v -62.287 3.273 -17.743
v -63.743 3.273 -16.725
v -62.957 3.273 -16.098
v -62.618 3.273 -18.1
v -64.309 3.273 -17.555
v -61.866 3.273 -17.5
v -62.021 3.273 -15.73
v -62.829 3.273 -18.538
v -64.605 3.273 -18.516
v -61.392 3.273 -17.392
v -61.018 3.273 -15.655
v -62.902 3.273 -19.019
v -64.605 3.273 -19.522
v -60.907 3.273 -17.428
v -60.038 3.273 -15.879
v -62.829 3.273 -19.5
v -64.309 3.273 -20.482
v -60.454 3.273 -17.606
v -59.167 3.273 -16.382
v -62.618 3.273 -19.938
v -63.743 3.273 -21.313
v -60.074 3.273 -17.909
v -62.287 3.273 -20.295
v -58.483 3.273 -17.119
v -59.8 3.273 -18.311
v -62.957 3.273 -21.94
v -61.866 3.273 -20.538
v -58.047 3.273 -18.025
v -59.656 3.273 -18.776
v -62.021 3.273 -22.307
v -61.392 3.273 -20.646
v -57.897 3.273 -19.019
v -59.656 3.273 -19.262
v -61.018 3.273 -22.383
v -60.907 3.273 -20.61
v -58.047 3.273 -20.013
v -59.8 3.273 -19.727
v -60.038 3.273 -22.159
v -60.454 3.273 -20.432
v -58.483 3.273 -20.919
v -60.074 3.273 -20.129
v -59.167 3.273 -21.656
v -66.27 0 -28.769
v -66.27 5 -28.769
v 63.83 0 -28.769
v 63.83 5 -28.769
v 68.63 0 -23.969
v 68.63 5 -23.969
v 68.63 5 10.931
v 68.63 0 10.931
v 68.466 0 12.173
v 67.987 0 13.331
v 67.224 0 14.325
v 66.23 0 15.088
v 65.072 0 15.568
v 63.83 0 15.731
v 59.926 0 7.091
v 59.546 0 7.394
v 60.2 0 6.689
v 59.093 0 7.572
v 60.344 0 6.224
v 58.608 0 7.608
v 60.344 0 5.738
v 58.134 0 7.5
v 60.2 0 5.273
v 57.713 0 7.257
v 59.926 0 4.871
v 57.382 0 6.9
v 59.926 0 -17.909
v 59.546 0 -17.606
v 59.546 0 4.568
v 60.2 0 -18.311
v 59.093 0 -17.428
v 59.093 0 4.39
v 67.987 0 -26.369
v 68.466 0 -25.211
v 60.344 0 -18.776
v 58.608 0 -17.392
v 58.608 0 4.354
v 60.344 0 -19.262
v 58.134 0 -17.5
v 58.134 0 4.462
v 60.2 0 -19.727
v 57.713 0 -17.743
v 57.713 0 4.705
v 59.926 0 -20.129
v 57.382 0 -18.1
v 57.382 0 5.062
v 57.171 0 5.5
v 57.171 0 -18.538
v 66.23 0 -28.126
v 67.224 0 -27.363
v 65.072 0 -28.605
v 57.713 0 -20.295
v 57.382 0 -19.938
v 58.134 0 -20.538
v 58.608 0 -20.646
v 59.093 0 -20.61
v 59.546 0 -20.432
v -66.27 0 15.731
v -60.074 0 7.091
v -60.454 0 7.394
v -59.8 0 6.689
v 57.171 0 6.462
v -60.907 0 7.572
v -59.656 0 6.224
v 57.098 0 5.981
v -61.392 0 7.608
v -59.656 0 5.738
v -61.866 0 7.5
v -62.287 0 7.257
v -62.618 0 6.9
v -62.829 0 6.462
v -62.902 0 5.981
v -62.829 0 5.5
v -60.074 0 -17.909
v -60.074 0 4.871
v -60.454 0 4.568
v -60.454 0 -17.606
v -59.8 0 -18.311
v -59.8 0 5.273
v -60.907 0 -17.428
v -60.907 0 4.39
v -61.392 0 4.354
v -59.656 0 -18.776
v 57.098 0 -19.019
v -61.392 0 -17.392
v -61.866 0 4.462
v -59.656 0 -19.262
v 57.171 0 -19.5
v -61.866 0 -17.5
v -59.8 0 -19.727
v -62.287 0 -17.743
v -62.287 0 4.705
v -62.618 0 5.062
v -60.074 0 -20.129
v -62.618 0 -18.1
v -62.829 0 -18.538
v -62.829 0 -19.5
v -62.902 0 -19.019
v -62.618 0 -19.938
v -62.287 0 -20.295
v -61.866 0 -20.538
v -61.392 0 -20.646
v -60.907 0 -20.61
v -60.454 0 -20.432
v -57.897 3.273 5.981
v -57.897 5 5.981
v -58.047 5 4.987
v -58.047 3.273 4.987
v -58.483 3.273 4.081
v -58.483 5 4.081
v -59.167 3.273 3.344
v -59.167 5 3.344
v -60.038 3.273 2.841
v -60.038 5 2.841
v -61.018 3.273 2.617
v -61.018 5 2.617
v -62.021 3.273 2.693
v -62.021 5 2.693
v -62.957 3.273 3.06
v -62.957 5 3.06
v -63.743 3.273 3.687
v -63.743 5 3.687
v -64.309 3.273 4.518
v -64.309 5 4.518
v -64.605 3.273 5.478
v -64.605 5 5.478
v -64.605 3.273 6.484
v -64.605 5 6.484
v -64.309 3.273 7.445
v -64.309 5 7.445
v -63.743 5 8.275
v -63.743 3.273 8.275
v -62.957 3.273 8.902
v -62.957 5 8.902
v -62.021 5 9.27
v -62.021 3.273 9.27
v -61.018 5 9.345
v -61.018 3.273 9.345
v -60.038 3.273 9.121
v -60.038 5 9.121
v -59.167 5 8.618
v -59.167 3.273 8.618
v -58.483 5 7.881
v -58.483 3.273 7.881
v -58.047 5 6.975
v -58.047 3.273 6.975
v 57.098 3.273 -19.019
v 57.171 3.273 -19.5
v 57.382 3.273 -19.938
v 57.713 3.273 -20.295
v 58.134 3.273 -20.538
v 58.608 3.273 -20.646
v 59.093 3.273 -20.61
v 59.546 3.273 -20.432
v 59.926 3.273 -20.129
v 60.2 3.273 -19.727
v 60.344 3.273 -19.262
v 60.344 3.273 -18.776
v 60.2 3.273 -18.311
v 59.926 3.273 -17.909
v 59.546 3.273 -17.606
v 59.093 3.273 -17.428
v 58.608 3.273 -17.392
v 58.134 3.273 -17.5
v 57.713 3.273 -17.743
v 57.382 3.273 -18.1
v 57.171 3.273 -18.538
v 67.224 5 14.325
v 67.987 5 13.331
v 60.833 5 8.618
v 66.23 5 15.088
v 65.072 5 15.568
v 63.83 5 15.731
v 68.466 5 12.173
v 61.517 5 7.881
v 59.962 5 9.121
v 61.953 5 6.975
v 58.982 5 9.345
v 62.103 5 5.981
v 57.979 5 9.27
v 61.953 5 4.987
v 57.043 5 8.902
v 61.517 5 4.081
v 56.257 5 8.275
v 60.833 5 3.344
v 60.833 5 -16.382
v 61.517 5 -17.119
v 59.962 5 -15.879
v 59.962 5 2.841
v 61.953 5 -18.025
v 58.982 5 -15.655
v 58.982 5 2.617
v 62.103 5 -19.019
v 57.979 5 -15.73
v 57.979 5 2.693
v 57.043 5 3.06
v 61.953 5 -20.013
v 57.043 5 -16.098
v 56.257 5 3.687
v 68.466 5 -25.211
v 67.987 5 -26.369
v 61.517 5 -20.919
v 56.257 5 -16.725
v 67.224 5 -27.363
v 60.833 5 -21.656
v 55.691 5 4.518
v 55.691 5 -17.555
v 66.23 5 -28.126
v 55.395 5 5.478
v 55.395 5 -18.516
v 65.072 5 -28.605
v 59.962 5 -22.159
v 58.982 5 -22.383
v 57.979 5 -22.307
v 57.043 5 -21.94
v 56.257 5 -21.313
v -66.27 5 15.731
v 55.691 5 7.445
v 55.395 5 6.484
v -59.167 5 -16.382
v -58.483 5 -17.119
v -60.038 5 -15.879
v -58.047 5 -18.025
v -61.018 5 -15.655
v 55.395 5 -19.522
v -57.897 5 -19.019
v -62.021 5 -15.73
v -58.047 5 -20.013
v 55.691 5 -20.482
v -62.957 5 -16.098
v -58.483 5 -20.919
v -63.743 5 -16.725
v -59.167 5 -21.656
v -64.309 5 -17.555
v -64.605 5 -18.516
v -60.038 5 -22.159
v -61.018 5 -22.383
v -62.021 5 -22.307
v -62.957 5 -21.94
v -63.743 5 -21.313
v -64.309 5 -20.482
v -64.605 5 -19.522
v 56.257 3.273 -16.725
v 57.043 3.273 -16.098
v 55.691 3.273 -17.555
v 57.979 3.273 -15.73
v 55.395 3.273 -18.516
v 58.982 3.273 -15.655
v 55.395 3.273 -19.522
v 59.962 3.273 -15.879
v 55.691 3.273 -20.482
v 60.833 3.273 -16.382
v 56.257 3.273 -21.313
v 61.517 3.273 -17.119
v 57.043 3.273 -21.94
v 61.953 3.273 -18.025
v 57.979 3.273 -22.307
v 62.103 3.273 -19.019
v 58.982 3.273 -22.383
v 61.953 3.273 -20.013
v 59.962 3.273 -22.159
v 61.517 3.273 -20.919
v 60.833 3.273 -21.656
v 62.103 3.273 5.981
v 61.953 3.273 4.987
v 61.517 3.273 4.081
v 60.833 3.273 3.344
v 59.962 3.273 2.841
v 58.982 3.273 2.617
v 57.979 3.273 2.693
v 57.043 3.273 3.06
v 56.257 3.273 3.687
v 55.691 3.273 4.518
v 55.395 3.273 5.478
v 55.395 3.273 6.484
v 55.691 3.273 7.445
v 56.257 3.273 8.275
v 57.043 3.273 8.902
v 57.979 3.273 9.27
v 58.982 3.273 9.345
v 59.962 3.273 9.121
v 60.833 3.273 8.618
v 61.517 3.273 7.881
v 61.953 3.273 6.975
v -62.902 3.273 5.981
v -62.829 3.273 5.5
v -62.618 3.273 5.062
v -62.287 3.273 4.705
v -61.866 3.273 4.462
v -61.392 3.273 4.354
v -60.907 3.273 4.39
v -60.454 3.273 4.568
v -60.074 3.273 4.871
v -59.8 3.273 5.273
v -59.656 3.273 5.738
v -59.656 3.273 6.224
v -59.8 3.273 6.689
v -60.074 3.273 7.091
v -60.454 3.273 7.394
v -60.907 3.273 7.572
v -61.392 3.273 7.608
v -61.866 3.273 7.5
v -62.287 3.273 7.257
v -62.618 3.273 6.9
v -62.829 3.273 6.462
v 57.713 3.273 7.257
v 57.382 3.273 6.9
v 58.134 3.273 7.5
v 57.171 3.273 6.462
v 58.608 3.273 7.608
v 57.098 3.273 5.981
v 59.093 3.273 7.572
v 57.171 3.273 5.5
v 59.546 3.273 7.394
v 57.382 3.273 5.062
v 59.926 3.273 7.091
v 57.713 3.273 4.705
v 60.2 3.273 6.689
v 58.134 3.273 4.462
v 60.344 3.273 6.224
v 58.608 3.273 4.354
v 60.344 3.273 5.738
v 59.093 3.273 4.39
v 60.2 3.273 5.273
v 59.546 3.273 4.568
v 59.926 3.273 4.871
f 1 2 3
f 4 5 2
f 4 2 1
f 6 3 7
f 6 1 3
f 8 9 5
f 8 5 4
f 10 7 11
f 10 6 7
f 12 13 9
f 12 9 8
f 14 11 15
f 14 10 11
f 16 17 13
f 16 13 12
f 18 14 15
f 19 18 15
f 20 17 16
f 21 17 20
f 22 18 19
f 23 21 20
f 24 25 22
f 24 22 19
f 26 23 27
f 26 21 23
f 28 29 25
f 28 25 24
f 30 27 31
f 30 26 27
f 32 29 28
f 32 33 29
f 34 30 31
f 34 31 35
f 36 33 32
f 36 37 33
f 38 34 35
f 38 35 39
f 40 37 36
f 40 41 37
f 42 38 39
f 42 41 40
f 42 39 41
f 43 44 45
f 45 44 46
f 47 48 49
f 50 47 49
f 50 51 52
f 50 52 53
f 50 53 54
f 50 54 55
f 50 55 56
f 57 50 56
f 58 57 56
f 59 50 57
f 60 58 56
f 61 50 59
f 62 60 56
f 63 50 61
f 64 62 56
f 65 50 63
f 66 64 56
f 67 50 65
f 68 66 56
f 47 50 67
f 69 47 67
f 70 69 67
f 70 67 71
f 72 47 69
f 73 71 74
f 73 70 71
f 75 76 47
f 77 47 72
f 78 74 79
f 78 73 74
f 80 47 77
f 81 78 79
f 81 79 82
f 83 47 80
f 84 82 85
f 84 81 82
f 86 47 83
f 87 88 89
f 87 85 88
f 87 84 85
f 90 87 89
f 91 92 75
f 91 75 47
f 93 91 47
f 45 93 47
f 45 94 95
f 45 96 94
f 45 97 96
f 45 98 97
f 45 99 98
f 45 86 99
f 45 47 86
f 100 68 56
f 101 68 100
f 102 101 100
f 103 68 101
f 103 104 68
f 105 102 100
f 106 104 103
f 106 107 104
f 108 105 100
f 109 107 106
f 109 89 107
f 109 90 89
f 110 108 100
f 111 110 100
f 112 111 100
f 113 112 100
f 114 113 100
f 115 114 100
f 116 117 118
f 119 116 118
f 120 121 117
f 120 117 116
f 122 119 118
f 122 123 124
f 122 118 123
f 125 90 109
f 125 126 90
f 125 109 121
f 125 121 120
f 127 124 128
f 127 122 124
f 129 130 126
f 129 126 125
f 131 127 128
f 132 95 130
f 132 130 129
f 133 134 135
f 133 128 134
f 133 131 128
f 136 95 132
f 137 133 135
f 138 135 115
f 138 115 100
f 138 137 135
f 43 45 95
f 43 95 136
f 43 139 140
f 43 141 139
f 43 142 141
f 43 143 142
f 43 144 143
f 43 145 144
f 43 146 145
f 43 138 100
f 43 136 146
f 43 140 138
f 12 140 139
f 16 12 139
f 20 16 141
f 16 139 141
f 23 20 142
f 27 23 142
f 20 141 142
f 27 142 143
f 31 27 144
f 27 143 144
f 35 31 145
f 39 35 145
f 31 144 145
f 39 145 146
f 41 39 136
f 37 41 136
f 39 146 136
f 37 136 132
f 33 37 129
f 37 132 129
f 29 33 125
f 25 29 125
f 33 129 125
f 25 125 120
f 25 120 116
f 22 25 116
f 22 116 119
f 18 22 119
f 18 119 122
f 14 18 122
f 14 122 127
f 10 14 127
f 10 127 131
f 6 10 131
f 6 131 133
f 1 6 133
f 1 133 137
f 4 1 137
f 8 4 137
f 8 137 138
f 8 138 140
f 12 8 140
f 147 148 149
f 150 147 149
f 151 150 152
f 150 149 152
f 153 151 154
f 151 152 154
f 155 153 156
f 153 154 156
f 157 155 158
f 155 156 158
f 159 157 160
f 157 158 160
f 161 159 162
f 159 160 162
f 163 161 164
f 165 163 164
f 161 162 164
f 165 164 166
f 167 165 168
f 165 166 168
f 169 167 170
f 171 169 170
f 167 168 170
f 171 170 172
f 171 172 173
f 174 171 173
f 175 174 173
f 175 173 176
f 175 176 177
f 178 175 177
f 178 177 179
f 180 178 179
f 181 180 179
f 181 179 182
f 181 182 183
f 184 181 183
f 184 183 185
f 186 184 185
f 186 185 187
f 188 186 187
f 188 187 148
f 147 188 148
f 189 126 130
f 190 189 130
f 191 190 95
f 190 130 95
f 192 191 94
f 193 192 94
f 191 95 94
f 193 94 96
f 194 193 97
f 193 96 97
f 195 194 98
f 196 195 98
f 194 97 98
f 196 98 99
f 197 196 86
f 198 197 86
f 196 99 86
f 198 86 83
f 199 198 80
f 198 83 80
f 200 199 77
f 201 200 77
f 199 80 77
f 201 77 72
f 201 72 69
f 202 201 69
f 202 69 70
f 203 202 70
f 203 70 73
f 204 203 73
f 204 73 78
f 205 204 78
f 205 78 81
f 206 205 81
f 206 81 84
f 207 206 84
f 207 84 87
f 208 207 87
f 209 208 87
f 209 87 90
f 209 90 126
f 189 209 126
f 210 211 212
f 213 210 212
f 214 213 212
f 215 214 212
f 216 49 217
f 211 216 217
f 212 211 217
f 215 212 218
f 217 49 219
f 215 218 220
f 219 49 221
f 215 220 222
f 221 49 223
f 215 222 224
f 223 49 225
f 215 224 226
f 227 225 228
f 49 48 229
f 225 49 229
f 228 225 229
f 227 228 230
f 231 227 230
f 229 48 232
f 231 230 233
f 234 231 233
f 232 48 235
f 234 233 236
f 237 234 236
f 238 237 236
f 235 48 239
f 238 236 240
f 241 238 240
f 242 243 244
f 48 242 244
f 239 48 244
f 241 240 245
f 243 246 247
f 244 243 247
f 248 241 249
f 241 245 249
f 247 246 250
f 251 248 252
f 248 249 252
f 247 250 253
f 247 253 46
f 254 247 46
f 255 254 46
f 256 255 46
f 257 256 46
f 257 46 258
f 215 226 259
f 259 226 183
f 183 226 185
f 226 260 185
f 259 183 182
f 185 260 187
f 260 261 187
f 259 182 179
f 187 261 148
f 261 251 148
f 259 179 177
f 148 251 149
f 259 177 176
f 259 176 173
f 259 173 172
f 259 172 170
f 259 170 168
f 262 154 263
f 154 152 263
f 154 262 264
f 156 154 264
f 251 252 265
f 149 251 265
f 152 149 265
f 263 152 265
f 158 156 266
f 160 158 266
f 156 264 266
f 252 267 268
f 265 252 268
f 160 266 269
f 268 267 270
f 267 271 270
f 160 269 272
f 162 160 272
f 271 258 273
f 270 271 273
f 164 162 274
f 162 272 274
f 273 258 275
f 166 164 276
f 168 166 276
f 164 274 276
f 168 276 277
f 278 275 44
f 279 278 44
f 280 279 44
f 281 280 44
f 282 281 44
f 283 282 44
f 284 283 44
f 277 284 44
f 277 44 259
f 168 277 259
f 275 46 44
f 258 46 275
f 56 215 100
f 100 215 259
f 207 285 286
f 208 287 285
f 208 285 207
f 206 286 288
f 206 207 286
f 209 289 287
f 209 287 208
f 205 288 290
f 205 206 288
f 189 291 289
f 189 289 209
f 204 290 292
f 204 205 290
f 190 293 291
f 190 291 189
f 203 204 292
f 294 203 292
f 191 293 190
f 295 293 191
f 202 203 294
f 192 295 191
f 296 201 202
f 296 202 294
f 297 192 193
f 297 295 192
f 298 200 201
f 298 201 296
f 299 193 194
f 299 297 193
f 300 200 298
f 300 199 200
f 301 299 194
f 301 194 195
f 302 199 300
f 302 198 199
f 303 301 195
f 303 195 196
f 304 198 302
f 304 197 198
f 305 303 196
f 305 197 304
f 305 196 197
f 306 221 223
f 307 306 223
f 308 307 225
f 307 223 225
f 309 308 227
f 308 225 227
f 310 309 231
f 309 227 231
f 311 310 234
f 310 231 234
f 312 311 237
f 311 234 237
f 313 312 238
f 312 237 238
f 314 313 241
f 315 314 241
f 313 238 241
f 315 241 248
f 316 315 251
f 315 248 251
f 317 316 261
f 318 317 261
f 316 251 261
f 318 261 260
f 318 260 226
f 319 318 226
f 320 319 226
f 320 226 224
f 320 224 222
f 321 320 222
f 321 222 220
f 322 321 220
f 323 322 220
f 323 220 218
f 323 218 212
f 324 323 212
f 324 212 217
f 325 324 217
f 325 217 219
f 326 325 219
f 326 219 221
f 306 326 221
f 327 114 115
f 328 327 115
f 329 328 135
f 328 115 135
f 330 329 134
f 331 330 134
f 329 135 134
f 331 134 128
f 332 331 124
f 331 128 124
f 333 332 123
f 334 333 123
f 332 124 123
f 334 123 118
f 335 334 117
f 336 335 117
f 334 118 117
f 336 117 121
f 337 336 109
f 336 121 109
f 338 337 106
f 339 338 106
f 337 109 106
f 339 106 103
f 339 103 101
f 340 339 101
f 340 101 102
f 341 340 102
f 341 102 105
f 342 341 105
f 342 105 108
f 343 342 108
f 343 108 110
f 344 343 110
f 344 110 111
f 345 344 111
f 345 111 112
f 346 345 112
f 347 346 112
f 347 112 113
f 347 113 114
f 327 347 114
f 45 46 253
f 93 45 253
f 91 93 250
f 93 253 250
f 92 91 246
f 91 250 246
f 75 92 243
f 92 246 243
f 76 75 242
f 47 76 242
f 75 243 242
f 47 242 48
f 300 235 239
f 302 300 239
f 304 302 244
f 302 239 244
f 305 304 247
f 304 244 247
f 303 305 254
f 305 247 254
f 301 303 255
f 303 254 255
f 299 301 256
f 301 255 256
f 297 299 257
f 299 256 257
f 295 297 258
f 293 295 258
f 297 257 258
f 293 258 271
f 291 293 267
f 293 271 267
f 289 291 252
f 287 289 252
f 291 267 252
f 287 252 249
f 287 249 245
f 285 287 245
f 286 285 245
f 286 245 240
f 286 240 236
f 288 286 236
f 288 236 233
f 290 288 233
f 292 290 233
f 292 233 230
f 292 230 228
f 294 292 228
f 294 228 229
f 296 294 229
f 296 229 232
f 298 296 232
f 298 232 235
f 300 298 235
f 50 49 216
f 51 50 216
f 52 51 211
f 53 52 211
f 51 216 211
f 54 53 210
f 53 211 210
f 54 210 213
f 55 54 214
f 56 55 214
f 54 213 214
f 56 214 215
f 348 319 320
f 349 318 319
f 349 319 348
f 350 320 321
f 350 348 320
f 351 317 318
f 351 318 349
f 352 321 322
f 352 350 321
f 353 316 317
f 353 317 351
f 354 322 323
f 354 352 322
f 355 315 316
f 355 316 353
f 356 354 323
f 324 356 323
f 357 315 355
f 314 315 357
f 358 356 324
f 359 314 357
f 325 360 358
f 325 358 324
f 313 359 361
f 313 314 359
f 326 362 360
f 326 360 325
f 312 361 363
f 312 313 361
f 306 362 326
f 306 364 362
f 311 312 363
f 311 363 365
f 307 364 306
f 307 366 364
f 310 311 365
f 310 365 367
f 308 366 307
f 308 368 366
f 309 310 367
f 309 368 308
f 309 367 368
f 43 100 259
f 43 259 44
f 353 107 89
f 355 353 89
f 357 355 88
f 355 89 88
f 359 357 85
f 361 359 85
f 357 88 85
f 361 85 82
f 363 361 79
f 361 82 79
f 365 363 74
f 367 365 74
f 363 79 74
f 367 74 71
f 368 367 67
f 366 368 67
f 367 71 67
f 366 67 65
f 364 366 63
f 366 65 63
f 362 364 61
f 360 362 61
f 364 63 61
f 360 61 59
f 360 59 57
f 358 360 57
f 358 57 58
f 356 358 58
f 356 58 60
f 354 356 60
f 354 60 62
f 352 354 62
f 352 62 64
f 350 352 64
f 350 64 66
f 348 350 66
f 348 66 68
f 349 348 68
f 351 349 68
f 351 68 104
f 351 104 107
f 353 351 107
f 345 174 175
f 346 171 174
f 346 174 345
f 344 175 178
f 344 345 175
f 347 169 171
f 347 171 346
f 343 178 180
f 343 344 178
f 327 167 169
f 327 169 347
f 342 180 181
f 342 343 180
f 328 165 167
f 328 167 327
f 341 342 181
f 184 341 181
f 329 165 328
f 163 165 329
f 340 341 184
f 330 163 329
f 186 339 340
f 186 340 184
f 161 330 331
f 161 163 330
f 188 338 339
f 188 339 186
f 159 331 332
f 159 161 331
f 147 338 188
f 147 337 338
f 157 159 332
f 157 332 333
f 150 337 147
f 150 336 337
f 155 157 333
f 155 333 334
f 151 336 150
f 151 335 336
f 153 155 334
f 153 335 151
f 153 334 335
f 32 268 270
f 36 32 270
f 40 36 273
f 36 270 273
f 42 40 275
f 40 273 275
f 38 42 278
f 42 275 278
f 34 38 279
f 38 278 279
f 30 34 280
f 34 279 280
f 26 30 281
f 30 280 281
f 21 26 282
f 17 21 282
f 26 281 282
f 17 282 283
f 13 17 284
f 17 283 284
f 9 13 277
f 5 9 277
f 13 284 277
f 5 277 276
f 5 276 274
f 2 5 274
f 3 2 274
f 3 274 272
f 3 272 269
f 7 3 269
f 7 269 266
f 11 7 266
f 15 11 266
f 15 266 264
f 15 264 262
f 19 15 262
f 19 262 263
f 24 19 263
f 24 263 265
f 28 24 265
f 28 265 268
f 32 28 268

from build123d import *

# Parameters (mm, degrees)
SKETCH1_W                                           = 130
SKETCH1_H                                           = 44.5
BOSS_EXTRUDE1_DEPTH                                 = 5
CBORE_FOR_4_BINDING_HEAD_MACHINE_SCREW1_D           = 3.2639
CBORE_FOR_4_BINDING_HEAD_MACHINE_SCREW1_DEPTH       = 5
CBORE_FOR_4_BINDING_HEAD_MACHINE_SCREW1_CBORE_D     = 6.74624
CBORE_FOR_4_BINDING_HEAD_MACHINE_SCREW1_CBORE_DEPTH = 1.7272
BOSS_EXTRUDE2_DEPTH                                 = 5


with BuildPart() as part:
    # Sketch1 → Boss-Extrude1 (new body)
    with BuildSketch(Plane(origin=(0, 0, 0), x_dir=(1, 0, 0), z_dir=(0, 1, 0))):
        with Locations((-1.26999387, 6.518895388)):
            Rectangle(SKETCH1_W, SKETCH1_H)
    extrude(amount=BOSS_EXTRUDE1_DEPTH)

    # CBORE for #4 Binding Head Machine Screw1
    with Locations(Plane(origin=(0, 5, 0), x_dir=(1, 0, 0), z_dir=(0, 1, 0))):
        with Locations((-61.26999387, 19.018895388), (-61.26999387, -5.981104612), (58.73000613, -5.981104612), (58.73000613, 19.018895388)):
            CounterBoreHole(CBORE_FOR_4_BINDING_HEAD_MACHINE_SCREW1_D / 2, CBORE_FOR_4_BINDING_HEAD_MACHINE_SCREW1_CBORE_D / 2, CBORE_FOR_4_BINDING_HEAD_MACHINE_SCREW1_CBORE_DEPTH, depth=CBORE_FOR_4_BINDING_HEAD_MACHINE_SCREW1_DEPTH)

    # Sketch6 → Boss-Extrude2 (add)
    with BuildSketch(Plane(origin=(0, 5, 0), x_dir=(1, 0, 0), z_dir=(0, 1, 0))):
        with BuildLine():
            Line((63.73000613, 28.768895388), (63.83000613, 28.768895388))
            ThreePointArc((63.83000613, 28.768895388), (67.22411868, 27.363007938), (68.63000613, 23.968895388))
            Line((68.63000613, 23.968895388), (68.63000613, -10.931104612))
            ThreePointArc((68.63000613, -10.931104612), (67.22411868, -14.325217161), (63.83000613, -15.731104612))
            Line((63.83000613, -15.731104612), (63.73000613, -15.731104612))
            Line((63.73000613, -15.731104612), (63.73000613, 28.768895388))
        make_face()
    extrude(amount=-BOSS_EXTRUDE2_DEPTH)


solid = part.part
